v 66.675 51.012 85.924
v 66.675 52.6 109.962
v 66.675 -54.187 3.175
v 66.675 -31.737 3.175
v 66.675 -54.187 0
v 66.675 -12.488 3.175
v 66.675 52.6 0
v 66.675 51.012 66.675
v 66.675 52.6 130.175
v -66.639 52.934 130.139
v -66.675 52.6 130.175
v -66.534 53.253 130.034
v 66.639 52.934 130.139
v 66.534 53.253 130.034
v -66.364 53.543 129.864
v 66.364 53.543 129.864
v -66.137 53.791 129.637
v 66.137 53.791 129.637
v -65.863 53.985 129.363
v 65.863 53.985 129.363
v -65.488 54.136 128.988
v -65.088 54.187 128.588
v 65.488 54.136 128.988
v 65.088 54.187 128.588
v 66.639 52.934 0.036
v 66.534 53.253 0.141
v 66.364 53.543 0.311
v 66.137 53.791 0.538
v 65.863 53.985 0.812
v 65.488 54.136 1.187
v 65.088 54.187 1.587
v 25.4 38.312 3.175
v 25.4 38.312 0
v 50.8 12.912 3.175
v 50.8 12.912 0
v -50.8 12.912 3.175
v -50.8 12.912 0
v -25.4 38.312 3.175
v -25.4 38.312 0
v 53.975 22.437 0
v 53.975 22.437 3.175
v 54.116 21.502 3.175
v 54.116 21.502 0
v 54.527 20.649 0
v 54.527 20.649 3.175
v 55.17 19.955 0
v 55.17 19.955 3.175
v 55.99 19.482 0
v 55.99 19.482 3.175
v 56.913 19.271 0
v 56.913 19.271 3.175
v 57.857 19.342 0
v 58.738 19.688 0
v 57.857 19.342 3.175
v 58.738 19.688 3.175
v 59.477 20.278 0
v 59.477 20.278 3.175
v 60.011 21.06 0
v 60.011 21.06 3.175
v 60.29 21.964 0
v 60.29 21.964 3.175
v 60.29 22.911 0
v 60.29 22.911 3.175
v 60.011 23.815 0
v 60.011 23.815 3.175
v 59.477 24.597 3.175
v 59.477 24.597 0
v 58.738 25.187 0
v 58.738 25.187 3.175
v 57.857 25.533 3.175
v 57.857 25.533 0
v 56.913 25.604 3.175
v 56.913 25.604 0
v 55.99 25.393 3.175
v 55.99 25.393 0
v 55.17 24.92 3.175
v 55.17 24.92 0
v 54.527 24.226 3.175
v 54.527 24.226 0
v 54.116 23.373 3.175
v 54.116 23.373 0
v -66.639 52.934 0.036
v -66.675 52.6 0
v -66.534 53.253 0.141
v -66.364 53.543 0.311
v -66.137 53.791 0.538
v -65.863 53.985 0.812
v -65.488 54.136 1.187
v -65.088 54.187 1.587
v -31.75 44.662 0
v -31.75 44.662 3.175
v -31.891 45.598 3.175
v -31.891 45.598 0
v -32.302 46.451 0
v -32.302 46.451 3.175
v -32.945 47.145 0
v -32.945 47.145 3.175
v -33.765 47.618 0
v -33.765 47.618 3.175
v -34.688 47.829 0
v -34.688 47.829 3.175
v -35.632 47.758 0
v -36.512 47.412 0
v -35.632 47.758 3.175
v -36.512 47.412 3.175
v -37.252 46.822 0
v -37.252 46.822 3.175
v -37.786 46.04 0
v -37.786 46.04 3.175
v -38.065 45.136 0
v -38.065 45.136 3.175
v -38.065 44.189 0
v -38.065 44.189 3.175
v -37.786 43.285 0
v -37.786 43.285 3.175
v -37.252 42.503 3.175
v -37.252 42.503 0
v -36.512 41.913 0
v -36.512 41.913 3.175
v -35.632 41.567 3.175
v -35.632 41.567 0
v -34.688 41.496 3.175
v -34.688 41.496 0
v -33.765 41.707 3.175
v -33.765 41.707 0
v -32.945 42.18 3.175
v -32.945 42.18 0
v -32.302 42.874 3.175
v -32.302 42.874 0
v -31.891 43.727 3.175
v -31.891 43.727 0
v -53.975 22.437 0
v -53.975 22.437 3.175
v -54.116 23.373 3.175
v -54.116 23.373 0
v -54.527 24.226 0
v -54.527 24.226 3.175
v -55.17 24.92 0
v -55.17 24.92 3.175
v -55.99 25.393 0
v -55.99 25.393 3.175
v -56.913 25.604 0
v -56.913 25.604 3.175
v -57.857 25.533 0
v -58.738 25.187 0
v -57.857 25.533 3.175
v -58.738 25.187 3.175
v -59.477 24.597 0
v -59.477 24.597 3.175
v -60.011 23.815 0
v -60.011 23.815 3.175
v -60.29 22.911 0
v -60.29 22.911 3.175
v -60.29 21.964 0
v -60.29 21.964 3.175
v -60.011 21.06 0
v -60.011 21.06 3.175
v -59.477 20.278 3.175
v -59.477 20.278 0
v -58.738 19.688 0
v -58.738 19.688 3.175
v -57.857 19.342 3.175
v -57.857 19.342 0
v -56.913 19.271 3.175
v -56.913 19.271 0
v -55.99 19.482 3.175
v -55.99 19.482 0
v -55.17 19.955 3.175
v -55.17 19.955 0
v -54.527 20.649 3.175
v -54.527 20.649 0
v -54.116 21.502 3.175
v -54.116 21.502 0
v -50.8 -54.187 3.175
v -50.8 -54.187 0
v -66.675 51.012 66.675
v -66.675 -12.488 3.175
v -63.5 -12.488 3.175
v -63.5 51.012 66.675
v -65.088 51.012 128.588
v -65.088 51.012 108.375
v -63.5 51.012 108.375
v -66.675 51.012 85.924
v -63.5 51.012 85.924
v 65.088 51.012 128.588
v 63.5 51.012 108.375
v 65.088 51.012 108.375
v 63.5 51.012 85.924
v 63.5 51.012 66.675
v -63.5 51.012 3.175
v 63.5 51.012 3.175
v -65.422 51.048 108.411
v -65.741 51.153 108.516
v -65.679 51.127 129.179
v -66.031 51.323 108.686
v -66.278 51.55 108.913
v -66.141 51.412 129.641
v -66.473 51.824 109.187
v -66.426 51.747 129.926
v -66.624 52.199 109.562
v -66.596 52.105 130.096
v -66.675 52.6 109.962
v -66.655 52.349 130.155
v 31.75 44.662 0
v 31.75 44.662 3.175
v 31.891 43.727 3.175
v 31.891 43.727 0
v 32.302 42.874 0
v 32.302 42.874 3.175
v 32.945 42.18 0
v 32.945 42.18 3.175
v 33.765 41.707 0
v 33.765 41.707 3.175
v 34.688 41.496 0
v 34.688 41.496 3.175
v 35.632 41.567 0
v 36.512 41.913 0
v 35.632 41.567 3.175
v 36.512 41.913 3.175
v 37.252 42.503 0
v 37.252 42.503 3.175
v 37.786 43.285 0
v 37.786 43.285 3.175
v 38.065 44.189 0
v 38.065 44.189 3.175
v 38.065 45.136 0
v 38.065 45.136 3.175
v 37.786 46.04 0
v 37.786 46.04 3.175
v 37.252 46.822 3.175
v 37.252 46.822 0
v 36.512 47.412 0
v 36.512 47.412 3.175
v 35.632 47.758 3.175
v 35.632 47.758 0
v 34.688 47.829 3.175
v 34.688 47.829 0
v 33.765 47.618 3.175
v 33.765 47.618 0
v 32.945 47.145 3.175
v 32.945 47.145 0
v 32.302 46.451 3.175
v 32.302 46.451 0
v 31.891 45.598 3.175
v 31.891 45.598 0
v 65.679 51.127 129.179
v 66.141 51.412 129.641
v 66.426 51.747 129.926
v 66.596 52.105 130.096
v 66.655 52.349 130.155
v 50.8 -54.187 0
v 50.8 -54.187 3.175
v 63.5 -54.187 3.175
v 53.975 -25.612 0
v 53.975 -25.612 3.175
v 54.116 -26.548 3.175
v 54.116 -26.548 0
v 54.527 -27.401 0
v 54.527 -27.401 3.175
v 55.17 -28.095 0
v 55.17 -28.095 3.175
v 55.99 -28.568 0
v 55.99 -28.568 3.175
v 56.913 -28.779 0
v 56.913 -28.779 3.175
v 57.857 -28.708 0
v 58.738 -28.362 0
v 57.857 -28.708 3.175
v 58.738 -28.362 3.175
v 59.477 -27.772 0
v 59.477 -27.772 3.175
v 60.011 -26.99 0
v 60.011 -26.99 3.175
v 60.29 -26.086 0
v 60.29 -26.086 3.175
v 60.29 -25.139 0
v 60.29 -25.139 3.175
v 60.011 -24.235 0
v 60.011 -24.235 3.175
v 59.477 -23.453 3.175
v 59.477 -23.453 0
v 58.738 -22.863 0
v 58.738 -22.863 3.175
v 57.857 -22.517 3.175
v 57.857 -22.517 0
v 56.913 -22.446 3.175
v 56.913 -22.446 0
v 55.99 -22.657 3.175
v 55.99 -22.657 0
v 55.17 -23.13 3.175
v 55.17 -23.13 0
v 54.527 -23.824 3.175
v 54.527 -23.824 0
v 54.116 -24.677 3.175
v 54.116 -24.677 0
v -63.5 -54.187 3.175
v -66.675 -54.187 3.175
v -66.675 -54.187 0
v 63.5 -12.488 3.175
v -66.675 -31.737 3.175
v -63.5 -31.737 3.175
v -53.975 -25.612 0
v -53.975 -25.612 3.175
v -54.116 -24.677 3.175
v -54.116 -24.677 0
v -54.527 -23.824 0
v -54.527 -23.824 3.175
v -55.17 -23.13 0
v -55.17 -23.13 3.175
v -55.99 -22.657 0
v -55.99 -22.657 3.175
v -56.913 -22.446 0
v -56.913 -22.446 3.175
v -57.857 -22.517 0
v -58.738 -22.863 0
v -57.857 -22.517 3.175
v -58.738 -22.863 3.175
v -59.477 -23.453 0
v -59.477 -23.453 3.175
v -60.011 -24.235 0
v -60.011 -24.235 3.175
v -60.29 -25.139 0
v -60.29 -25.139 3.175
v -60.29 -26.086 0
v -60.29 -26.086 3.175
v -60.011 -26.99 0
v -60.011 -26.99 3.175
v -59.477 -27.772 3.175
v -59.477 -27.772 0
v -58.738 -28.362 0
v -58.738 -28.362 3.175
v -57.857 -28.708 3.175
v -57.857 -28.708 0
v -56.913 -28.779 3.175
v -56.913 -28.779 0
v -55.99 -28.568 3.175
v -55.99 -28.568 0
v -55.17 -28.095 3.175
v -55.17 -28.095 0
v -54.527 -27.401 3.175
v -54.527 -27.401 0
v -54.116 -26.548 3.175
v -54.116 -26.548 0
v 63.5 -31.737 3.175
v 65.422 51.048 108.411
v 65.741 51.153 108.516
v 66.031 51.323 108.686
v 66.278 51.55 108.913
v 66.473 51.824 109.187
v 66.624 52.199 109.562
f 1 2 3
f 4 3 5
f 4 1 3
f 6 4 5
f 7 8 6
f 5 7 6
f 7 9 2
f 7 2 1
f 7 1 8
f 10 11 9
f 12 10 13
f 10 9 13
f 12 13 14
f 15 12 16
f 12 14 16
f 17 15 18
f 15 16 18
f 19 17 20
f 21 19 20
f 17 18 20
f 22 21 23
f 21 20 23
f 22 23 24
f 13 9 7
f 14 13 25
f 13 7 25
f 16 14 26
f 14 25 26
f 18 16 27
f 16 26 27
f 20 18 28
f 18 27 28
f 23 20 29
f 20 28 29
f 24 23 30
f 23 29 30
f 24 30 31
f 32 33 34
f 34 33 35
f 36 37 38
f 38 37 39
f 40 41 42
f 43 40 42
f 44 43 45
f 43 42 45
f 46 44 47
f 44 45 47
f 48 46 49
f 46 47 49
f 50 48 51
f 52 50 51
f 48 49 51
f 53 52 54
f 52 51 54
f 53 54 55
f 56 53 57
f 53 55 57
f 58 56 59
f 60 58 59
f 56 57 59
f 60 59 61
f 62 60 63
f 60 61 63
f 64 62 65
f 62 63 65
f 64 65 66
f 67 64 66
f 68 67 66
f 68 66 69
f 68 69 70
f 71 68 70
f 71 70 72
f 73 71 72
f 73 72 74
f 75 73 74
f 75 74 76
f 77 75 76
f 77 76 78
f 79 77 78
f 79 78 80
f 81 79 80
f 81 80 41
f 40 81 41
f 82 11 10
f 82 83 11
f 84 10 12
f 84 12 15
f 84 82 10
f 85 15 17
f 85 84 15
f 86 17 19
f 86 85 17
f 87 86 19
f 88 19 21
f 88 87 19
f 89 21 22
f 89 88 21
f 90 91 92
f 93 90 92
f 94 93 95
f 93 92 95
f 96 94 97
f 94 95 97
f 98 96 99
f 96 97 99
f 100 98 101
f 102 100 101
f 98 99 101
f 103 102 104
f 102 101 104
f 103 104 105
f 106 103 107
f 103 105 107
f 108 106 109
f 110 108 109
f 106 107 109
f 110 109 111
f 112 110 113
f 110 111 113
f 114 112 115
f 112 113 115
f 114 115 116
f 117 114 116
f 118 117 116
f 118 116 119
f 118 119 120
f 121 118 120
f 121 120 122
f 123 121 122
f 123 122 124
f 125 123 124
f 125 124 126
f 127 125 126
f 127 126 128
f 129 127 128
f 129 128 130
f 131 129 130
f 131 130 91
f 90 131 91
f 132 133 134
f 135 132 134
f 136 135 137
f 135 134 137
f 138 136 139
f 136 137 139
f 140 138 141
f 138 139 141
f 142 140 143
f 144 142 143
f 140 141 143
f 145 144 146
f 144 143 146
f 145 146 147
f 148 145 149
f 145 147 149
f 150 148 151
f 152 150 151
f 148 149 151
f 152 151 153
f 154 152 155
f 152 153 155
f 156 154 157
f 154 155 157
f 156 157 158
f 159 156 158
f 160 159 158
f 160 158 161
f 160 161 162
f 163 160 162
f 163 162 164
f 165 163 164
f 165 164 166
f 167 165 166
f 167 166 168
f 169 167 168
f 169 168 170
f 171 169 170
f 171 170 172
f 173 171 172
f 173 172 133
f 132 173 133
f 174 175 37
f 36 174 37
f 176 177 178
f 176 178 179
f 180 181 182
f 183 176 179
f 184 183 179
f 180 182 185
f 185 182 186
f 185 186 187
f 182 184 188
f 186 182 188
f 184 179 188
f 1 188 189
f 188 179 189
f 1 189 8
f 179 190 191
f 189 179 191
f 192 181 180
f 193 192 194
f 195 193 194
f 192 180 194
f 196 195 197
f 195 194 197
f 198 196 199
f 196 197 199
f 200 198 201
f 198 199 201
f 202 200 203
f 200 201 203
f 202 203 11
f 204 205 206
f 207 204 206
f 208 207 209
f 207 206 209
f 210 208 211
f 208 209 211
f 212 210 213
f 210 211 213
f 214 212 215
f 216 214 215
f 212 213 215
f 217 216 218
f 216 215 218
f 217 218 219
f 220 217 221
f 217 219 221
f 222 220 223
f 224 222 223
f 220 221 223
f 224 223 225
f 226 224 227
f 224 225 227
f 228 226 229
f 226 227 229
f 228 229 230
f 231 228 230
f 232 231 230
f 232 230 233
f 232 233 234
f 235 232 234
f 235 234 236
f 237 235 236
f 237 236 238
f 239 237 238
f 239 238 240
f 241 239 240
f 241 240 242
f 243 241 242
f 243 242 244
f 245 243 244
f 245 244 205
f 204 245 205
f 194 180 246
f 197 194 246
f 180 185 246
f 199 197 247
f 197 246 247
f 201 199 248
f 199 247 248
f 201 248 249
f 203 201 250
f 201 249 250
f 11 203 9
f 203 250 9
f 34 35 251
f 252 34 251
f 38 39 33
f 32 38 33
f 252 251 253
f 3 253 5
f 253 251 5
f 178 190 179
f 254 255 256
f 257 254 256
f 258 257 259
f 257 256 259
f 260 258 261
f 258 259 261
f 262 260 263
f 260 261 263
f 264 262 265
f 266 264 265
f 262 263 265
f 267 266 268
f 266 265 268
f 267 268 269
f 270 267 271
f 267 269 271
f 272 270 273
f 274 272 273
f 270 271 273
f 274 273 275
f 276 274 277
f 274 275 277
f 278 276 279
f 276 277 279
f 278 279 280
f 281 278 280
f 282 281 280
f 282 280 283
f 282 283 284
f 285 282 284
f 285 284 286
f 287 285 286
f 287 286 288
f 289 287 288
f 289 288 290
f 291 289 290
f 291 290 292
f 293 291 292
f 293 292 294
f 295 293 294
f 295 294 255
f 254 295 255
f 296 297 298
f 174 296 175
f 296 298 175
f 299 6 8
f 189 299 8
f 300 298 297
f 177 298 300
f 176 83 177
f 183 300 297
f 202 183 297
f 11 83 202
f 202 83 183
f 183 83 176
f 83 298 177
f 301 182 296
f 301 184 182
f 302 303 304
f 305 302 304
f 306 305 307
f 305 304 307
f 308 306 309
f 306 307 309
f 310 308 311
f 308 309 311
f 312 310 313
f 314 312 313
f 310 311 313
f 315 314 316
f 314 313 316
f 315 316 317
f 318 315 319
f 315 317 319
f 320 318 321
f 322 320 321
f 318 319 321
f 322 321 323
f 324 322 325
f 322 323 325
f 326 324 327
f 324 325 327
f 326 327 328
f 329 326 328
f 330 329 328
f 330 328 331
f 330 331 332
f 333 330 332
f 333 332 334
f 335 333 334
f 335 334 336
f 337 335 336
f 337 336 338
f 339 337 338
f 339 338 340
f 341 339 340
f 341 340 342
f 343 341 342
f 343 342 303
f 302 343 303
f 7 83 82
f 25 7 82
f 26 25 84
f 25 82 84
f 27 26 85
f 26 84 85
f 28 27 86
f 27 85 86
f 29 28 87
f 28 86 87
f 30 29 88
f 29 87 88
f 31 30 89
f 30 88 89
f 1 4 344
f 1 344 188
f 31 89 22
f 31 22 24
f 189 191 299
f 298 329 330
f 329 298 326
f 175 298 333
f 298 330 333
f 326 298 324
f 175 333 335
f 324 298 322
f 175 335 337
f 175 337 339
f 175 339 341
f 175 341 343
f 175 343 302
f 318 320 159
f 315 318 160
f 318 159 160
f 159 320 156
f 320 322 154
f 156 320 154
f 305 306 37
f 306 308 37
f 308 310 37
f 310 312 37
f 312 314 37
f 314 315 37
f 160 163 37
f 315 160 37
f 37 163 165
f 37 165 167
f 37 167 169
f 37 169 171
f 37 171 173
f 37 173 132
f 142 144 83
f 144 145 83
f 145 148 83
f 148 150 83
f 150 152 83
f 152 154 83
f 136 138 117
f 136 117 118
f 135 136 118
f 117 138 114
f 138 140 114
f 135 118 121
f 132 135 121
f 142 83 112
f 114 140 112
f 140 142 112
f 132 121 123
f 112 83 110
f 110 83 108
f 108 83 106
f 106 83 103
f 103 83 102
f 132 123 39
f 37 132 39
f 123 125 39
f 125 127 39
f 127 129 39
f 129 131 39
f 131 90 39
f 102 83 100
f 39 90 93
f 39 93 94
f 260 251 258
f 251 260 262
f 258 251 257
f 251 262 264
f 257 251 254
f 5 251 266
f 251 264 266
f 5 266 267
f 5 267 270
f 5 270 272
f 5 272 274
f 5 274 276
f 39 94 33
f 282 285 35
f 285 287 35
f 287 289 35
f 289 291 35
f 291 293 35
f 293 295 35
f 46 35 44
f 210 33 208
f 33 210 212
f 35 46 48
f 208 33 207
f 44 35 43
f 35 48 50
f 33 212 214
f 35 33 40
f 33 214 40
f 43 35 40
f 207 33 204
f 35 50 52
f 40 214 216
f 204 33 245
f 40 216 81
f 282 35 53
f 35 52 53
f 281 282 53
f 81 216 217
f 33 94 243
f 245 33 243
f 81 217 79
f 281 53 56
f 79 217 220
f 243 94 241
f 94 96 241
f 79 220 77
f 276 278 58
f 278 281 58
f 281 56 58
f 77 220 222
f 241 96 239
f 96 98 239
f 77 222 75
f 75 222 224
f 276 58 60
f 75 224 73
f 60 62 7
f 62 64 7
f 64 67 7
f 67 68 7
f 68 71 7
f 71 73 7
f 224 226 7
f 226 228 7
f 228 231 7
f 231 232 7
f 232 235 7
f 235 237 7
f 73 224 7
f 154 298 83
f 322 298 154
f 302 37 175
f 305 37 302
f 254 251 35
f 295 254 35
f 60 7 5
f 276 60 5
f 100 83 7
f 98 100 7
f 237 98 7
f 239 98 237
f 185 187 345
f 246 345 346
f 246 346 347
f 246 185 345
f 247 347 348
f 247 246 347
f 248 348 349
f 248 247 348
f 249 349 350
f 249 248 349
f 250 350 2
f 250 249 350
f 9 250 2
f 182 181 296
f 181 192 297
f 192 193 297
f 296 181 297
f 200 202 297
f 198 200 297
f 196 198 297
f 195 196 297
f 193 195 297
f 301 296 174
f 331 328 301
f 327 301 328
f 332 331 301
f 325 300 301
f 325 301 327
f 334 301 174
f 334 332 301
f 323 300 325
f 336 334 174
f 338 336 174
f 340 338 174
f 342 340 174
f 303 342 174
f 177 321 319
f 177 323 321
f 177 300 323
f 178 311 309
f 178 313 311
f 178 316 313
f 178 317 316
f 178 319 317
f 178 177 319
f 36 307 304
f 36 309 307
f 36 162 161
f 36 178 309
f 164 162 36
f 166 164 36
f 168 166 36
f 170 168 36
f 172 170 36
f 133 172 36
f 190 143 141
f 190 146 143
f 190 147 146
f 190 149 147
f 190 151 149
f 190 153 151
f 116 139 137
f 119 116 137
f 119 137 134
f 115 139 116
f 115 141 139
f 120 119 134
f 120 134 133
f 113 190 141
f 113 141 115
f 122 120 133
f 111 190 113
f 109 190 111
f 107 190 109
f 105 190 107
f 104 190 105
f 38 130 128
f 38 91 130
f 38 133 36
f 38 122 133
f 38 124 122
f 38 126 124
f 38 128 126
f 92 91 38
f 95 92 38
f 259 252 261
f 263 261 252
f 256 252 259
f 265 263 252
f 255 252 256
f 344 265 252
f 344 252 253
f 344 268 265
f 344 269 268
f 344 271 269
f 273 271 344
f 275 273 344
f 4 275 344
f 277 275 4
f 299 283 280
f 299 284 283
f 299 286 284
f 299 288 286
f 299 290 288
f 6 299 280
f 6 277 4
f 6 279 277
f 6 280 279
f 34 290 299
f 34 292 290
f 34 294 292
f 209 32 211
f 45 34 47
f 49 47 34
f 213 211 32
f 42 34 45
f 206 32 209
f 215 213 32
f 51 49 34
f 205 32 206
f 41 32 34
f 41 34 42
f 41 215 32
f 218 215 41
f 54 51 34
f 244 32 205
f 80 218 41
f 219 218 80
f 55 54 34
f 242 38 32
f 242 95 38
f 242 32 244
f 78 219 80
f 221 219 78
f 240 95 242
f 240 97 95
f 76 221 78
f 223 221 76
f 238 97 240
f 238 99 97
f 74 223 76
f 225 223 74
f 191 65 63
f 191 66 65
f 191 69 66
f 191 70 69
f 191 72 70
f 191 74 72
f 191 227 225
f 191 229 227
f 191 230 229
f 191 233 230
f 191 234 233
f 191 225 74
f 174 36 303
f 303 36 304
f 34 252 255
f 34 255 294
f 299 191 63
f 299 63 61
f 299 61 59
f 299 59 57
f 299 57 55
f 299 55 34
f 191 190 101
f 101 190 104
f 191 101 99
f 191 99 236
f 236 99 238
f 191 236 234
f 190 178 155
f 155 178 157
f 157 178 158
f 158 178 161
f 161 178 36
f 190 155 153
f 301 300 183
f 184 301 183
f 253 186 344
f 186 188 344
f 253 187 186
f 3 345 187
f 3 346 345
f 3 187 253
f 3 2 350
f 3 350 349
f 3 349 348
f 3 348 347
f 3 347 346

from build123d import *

# Parameters (mm, degrees)
BOSS_EXTRUDE1_DEPTH = 3.175
SKETCH3_R           = 3.175
CUT_EXTRUDE1_DEPTH  = 86.976283948
SKETCH4_W           = 133.35
SKETCH4_H           = 3.175
BOSS_EXTRUDE2_DEPTH = 127
BOSS_EXTRUDE3_DEPTH = 3.175
BOSS_EXTRUDE4_DEPTH = 3.175
FILLET2_R           = 1.5875


with BuildPart() as part:
    # Sketch2 → Boss-Extrude1 (new body)
    with BuildSketch(Plane.XY):
        Polygon((-50.8, -54.187499956), (-50.8, 12.912499956), (-25.4, 38.312499956), (25.4, 38.312499956), (50.8, 12.912499956), (50.8, -54.187499956), (66.675, -54.187499956), (66.675, 54.187499956), (-66.675, 54.187499956), (-66.675, -54.187499956), align=None)
    extrude(amount=BOSS_EXTRUDE1_DEPTH)

    # Sketch3 → Cut-Extrude1 (cut, through all)
    with BuildSketch(Plane.XY.offset(3.175)):
        with Locations((-57.15, -25.612499956)):
            Circle(SKETCH3_R)
        with Locations((-57.15, 22.437499956)):
            Circle(SKETCH3_R)
        with Locations((-34.925, 44.662499956)):
            Circle(SKETCH3_R)
        with Locations(Location((34.925, 44.662499956, 0), (0, 0, 180))):
            Circle(SKETCH3_R)
        with Locations(Location((57.15, 22.437499956, 0), (0, 0, 180))):
            Circle(SKETCH3_R)
        with Locations(Location((57.15, -25.612499956, 0), (0, 0, 180))):
            Circle(SKETCH3_R)
    extrude(amount=-CUT_EXTRUDE1_DEPTH, mode=Mode.SUBTRACT)

    # Sketch4 → Boss-Extrude2 (add)
    with BuildSketch(Plane.XY.offset(3.175)):
        with Locations((0, 52.599999956)):
            Rectangle(SKETCH4_W, SKETCH4_H)
    extrude(amount=BOSS_EXTRUDE2_DEPTH)

    # Sketch5 → Boss-Extrude3 (add)
    with BuildSketch(Plane.ZY.offset(66.675)):
        Polygon((3.175, -12.487500044), (66.675, 51.012499956), (3.175, 51.012499956), align=None)
        Polygon((108.374999912, 51.012499956), (3.175, -54.187499956), (3.175, -31.736859653), (85.924359609, 51.012499956), align=None)
    extrude(amount=-BOSS_EXTRUDE3_DEPTH)

    # Sketch6 → Boss-Extrude4 (add)
    with BuildSketch(Plane(origin=(66.675, 0, 0), x_dir=(0, 0, -1), z_dir=(1, 0, 0))):
        Polygon((-108.374999912, 51.012499956), (-3.175, -54.187499956), (-3.175, -31.736859653), (-85.924359609, 51.012499956), align=None)
        Polygon((-3.175, -12.487500044), (-66.675, 51.012499956), (-3.175, 51.012499956), align=None)
    extrude(amount=-BOSS_EXTRUDE4_DEPTH)

    # Fillet2
    fillet2_edges = [part.edges().sort_by_distance(p)[0] for p in [
        (66.675, 54.187499956, 65.0875),
        (0, 54.187499956, 130.175),
        (-66.675, 54.187499956, 65.0875),
        (0, 54.187499956, 0),
        (66.675, 51.012499956, 119.274999956),
        (0, 51.012499956, 130.175),
        (-66.675, 51.012499956, 119.274999956),
    ]]
    fillet(fillet2_edges, radius=FILLET2_R - 0.0001)  # a hair under: the kernel refuses the full size


solid = part.part
